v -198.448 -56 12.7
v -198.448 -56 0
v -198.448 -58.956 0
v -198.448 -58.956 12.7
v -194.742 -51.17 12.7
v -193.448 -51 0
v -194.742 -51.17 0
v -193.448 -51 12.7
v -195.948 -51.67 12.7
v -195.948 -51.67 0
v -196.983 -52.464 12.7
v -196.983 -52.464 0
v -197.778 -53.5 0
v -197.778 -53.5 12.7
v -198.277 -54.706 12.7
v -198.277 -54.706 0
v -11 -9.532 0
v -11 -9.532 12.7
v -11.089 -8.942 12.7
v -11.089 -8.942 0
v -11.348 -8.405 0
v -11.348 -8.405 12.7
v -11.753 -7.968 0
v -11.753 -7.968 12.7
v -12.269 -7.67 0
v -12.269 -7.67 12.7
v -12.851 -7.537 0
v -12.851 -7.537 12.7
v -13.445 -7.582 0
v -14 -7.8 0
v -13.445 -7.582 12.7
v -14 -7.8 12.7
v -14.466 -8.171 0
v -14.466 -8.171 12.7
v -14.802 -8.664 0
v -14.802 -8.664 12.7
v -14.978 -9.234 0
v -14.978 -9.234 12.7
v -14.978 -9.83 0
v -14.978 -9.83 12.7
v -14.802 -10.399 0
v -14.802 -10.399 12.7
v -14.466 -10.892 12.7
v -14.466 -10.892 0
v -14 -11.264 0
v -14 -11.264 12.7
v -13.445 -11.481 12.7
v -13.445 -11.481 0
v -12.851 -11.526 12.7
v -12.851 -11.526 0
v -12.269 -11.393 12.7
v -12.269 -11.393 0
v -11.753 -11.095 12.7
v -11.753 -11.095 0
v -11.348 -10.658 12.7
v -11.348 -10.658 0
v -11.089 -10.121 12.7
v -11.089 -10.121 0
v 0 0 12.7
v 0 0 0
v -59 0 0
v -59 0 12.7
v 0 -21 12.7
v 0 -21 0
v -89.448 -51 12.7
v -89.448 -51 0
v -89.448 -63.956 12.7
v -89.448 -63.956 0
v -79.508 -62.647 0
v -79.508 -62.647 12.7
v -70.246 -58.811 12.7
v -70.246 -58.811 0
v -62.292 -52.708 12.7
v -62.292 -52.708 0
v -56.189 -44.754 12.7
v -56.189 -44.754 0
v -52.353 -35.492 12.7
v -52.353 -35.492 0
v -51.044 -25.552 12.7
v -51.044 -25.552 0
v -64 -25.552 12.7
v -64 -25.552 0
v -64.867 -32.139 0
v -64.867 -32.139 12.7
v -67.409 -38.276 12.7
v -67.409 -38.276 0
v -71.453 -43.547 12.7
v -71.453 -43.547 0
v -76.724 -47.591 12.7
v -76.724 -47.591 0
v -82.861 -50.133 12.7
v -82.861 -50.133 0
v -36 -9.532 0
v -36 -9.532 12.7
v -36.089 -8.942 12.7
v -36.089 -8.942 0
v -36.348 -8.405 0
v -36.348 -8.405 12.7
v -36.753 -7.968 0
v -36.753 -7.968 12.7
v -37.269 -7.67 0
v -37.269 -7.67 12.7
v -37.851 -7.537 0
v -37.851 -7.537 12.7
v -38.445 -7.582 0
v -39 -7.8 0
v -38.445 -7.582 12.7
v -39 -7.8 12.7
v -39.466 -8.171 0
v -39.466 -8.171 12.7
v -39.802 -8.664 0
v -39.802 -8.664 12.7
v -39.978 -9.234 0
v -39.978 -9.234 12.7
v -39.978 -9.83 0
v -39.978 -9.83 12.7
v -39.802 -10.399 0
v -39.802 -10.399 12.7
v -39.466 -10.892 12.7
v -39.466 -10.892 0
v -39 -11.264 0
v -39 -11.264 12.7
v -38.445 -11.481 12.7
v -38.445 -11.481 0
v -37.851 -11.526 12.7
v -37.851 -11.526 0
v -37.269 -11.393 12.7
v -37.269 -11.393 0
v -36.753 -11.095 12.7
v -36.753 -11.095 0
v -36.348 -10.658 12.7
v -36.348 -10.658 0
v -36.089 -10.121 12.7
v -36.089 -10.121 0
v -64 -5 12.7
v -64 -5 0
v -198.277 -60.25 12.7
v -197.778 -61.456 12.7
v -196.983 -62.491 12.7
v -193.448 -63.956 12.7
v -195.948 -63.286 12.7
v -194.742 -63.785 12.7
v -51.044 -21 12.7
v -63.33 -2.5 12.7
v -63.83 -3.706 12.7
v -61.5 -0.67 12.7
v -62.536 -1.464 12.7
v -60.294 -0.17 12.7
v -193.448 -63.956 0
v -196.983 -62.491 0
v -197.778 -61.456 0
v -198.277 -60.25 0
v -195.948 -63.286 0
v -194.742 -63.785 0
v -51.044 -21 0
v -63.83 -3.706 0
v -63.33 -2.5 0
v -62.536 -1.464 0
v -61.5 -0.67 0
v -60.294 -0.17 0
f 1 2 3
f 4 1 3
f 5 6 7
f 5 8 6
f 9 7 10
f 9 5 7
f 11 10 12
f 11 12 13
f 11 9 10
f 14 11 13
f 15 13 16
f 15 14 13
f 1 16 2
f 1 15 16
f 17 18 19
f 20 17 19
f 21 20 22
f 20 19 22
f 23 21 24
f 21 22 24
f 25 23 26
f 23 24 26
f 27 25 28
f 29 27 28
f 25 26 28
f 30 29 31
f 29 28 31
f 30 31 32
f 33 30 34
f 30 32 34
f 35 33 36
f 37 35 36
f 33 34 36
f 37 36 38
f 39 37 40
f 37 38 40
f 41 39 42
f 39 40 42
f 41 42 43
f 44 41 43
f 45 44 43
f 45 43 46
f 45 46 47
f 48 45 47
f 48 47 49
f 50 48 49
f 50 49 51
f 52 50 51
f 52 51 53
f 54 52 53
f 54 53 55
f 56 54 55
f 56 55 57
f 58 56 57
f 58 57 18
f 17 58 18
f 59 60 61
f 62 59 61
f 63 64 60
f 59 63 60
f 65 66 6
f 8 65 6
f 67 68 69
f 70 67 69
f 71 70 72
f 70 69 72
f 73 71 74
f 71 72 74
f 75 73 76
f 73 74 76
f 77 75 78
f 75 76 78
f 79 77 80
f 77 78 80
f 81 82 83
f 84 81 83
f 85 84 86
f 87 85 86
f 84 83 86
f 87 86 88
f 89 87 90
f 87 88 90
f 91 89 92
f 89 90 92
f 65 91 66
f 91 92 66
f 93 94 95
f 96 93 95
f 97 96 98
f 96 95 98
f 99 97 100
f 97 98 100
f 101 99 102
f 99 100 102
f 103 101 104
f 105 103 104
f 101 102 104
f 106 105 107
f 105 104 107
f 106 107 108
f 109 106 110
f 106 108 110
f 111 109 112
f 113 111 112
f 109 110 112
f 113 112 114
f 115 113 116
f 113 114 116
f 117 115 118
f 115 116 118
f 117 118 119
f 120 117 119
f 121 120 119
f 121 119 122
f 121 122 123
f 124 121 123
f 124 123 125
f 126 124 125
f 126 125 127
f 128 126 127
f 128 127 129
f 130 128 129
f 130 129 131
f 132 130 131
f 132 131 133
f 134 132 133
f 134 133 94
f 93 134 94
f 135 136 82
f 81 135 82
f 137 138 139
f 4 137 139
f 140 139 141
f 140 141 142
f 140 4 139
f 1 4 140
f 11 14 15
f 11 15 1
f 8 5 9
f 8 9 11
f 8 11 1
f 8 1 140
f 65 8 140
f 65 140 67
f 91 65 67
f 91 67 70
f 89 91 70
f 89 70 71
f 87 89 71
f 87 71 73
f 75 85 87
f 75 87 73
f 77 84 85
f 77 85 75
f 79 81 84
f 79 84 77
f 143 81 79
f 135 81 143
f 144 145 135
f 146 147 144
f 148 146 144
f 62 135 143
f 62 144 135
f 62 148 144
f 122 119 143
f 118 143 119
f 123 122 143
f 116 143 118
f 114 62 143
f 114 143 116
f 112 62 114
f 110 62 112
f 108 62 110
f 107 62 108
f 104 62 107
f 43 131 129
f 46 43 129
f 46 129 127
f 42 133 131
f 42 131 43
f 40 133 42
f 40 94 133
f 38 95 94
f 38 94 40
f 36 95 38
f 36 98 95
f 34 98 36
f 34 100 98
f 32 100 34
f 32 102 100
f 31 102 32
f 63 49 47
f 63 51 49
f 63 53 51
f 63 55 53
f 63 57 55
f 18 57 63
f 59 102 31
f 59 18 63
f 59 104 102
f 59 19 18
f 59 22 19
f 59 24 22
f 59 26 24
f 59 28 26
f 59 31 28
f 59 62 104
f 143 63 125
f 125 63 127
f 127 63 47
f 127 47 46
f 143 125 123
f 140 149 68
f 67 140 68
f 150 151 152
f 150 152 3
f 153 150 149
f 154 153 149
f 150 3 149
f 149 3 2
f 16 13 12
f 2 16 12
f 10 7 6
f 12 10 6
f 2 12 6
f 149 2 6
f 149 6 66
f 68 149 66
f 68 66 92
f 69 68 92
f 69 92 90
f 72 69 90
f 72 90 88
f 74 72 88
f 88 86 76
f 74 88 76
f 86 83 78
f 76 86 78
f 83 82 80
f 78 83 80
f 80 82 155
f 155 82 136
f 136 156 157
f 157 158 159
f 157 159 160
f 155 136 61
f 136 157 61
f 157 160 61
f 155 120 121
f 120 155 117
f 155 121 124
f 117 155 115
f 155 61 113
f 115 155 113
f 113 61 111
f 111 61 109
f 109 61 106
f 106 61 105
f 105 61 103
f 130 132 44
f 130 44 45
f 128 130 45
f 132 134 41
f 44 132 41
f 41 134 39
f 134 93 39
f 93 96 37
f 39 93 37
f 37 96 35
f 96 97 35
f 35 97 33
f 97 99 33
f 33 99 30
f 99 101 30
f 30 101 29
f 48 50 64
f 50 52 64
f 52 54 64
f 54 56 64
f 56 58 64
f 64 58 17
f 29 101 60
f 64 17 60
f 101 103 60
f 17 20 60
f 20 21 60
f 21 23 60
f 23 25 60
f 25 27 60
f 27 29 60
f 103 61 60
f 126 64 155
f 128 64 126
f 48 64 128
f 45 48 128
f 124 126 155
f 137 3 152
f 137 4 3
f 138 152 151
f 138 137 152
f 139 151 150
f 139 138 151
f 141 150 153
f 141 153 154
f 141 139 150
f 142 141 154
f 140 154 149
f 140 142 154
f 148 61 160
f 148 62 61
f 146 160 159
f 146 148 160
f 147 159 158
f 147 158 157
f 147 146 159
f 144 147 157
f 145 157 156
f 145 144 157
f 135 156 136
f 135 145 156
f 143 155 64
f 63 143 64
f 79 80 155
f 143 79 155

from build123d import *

# Parameters (mm, degrees)
BOSS_EXTRUDE1_DEPTH = 12.7
FILLET1_R           = 5
SKETCH2_R           = 2
CUT_EXTRUDE1_DEPTH  = 13.7


with BuildPart() as part:
    # Sketch1 → Boss-Extrude1 (new body)
    with BuildSketch(Plane.XY):
        with BuildLine():
            Line((0, 0), (-64, 0))
            Line((-64, 0), (-64, -25.552169744))
            ThreePointArc((-64, -25.552169744), (-71.453496915, -43.546503085), (-89.447830256, -51))
            Line((-89.447830256, -51), (-198.447830256, -51))
            Line((-198.447830256, -51), (-198.447830256, -63.95586098))
            Line((-198.447830256, -63.95586098), (-89.447830256, -63.95586098))
            ThreePointArc((-89.447830256, -63.95586098), (-62.29231976, -52.70768024), (-51.04413902, -25.552169744))
            Line((-51.04413902, -25.552169744), (-51.04413902, -21))
            Line((-51.04413902, -21), (0, -21))
            Line((0, -21), (0, 0))
        make_face()
    extrude(amount=BOSS_EXTRUDE1_DEPTH)

    # Fillet1
    fillet1_edges = [part.edges().sort_by_distance(p)[0] for p in [
        (-198.447830256, -63.95586098, 6.35),
        (-198.447830256, -51, 6.35),
        (-64, 0, 6.35),
    ]]
    fillet(fillet1_edges, radius=FILLET1_R)

    # Sketch2 → Cut-Extrude1 (cut, through all)
    with BuildSketch(Plane.XY.offset(12.7)):
        with Locations((-13, -9.531609903)):
            Circle(SKETCH2_R)
        with Locations((-38, -9.531609903)):
            Circle(SKETCH2_R)
    extrude(amount=-CUT_EXTRUDE1_DEPTH, mode=Mode.SUBTRACT)


solid = part.part
